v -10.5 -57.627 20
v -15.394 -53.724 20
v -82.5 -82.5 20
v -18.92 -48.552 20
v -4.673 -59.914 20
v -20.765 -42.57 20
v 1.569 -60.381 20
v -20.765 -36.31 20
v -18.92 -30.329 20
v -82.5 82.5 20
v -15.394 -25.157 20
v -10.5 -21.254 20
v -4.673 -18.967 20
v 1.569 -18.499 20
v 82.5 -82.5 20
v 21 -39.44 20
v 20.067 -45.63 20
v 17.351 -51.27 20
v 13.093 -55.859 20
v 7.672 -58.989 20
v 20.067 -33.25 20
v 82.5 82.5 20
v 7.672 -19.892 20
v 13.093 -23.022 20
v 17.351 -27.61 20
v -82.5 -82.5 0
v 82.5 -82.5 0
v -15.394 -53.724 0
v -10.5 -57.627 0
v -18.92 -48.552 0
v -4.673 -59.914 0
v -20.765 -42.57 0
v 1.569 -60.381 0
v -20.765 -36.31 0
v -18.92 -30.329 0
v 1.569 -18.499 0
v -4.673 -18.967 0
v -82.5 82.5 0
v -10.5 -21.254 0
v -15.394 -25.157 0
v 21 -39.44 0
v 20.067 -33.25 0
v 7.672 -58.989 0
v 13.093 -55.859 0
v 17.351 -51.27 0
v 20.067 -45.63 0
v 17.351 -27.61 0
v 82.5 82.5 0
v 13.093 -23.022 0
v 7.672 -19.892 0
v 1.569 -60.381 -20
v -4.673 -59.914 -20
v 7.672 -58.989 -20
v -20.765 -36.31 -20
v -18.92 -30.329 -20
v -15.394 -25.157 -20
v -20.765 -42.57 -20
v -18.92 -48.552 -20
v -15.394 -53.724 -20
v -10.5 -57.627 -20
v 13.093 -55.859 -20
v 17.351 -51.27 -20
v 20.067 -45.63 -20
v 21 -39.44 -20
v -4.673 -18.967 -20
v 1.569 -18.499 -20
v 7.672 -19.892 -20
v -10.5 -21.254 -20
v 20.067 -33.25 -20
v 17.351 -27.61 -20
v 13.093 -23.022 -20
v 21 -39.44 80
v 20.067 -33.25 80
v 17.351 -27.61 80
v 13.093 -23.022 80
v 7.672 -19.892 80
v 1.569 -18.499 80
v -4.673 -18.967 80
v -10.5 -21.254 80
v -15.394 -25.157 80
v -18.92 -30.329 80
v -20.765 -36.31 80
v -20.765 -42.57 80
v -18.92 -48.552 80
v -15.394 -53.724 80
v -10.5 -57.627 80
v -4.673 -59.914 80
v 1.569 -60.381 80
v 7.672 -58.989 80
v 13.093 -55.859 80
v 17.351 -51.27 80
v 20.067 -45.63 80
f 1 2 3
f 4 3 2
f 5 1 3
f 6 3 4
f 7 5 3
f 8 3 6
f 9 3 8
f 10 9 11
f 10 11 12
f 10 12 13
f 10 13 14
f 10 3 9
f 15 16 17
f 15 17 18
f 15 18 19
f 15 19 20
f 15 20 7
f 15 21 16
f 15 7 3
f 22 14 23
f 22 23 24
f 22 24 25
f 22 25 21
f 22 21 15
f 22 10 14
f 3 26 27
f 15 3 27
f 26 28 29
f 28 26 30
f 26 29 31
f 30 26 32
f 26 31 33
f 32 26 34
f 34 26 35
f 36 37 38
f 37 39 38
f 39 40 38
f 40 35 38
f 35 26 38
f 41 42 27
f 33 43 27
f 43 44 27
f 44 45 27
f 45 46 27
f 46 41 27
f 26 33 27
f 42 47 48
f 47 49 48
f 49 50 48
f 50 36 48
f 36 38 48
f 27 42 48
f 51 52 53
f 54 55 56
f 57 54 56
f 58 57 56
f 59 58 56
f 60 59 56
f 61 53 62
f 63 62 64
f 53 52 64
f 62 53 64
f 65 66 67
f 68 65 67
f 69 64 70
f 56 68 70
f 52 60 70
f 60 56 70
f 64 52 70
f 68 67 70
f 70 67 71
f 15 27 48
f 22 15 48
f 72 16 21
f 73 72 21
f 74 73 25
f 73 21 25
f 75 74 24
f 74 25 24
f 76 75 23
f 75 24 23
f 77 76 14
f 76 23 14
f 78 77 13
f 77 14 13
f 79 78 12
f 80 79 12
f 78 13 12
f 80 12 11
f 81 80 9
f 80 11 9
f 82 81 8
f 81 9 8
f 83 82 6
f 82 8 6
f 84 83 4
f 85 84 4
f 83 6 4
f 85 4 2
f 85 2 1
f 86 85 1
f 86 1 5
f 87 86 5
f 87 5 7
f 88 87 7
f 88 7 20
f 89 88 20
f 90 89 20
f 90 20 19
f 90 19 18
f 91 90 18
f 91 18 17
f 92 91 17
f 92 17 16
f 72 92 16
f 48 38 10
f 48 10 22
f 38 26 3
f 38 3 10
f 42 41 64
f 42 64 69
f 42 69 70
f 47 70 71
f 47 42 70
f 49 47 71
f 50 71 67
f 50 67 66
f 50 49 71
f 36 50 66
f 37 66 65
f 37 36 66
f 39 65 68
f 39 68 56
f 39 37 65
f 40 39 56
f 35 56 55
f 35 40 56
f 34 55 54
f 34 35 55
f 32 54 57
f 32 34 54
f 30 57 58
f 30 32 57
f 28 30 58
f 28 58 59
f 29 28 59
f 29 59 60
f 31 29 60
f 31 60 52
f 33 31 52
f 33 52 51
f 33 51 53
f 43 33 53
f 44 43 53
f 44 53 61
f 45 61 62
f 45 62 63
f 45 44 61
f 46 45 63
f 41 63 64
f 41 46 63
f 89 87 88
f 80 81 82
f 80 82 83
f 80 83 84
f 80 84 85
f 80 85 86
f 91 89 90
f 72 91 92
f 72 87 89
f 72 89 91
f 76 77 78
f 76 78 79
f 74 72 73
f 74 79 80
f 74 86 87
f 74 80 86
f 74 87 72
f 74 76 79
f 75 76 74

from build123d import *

# Parameters (mm, degrees)
F0_W     = 165
F0_H     = 165
F1_DEPTH = 20
F2_R     = 21
F3_DEPTH = 80
F4_DEPTH = 20


with BuildPart() as f1:
    # F0 (on Top) → F1 (new body)
    with BuildSketch(Plane.XY):
        Rectangle(F0_W, F0_H)
    extrude(amount=F1_DEPTH)

    # F2 (on Top) → F3 (join)
    with BuildSketch(Plane.XY):
        with Locations((0, -39.440217)):
            Circle(F2_R)
    extrude(amount=F3_DEPTH)

    # F2 (on Top) → F4 (join)
    with BuildSketch(Plane.XY):
        with Locations((0, -39.440217)):
            Circle(F2_R)
    extrude(amount=-F4_DEPTH)


solid = f1.part
